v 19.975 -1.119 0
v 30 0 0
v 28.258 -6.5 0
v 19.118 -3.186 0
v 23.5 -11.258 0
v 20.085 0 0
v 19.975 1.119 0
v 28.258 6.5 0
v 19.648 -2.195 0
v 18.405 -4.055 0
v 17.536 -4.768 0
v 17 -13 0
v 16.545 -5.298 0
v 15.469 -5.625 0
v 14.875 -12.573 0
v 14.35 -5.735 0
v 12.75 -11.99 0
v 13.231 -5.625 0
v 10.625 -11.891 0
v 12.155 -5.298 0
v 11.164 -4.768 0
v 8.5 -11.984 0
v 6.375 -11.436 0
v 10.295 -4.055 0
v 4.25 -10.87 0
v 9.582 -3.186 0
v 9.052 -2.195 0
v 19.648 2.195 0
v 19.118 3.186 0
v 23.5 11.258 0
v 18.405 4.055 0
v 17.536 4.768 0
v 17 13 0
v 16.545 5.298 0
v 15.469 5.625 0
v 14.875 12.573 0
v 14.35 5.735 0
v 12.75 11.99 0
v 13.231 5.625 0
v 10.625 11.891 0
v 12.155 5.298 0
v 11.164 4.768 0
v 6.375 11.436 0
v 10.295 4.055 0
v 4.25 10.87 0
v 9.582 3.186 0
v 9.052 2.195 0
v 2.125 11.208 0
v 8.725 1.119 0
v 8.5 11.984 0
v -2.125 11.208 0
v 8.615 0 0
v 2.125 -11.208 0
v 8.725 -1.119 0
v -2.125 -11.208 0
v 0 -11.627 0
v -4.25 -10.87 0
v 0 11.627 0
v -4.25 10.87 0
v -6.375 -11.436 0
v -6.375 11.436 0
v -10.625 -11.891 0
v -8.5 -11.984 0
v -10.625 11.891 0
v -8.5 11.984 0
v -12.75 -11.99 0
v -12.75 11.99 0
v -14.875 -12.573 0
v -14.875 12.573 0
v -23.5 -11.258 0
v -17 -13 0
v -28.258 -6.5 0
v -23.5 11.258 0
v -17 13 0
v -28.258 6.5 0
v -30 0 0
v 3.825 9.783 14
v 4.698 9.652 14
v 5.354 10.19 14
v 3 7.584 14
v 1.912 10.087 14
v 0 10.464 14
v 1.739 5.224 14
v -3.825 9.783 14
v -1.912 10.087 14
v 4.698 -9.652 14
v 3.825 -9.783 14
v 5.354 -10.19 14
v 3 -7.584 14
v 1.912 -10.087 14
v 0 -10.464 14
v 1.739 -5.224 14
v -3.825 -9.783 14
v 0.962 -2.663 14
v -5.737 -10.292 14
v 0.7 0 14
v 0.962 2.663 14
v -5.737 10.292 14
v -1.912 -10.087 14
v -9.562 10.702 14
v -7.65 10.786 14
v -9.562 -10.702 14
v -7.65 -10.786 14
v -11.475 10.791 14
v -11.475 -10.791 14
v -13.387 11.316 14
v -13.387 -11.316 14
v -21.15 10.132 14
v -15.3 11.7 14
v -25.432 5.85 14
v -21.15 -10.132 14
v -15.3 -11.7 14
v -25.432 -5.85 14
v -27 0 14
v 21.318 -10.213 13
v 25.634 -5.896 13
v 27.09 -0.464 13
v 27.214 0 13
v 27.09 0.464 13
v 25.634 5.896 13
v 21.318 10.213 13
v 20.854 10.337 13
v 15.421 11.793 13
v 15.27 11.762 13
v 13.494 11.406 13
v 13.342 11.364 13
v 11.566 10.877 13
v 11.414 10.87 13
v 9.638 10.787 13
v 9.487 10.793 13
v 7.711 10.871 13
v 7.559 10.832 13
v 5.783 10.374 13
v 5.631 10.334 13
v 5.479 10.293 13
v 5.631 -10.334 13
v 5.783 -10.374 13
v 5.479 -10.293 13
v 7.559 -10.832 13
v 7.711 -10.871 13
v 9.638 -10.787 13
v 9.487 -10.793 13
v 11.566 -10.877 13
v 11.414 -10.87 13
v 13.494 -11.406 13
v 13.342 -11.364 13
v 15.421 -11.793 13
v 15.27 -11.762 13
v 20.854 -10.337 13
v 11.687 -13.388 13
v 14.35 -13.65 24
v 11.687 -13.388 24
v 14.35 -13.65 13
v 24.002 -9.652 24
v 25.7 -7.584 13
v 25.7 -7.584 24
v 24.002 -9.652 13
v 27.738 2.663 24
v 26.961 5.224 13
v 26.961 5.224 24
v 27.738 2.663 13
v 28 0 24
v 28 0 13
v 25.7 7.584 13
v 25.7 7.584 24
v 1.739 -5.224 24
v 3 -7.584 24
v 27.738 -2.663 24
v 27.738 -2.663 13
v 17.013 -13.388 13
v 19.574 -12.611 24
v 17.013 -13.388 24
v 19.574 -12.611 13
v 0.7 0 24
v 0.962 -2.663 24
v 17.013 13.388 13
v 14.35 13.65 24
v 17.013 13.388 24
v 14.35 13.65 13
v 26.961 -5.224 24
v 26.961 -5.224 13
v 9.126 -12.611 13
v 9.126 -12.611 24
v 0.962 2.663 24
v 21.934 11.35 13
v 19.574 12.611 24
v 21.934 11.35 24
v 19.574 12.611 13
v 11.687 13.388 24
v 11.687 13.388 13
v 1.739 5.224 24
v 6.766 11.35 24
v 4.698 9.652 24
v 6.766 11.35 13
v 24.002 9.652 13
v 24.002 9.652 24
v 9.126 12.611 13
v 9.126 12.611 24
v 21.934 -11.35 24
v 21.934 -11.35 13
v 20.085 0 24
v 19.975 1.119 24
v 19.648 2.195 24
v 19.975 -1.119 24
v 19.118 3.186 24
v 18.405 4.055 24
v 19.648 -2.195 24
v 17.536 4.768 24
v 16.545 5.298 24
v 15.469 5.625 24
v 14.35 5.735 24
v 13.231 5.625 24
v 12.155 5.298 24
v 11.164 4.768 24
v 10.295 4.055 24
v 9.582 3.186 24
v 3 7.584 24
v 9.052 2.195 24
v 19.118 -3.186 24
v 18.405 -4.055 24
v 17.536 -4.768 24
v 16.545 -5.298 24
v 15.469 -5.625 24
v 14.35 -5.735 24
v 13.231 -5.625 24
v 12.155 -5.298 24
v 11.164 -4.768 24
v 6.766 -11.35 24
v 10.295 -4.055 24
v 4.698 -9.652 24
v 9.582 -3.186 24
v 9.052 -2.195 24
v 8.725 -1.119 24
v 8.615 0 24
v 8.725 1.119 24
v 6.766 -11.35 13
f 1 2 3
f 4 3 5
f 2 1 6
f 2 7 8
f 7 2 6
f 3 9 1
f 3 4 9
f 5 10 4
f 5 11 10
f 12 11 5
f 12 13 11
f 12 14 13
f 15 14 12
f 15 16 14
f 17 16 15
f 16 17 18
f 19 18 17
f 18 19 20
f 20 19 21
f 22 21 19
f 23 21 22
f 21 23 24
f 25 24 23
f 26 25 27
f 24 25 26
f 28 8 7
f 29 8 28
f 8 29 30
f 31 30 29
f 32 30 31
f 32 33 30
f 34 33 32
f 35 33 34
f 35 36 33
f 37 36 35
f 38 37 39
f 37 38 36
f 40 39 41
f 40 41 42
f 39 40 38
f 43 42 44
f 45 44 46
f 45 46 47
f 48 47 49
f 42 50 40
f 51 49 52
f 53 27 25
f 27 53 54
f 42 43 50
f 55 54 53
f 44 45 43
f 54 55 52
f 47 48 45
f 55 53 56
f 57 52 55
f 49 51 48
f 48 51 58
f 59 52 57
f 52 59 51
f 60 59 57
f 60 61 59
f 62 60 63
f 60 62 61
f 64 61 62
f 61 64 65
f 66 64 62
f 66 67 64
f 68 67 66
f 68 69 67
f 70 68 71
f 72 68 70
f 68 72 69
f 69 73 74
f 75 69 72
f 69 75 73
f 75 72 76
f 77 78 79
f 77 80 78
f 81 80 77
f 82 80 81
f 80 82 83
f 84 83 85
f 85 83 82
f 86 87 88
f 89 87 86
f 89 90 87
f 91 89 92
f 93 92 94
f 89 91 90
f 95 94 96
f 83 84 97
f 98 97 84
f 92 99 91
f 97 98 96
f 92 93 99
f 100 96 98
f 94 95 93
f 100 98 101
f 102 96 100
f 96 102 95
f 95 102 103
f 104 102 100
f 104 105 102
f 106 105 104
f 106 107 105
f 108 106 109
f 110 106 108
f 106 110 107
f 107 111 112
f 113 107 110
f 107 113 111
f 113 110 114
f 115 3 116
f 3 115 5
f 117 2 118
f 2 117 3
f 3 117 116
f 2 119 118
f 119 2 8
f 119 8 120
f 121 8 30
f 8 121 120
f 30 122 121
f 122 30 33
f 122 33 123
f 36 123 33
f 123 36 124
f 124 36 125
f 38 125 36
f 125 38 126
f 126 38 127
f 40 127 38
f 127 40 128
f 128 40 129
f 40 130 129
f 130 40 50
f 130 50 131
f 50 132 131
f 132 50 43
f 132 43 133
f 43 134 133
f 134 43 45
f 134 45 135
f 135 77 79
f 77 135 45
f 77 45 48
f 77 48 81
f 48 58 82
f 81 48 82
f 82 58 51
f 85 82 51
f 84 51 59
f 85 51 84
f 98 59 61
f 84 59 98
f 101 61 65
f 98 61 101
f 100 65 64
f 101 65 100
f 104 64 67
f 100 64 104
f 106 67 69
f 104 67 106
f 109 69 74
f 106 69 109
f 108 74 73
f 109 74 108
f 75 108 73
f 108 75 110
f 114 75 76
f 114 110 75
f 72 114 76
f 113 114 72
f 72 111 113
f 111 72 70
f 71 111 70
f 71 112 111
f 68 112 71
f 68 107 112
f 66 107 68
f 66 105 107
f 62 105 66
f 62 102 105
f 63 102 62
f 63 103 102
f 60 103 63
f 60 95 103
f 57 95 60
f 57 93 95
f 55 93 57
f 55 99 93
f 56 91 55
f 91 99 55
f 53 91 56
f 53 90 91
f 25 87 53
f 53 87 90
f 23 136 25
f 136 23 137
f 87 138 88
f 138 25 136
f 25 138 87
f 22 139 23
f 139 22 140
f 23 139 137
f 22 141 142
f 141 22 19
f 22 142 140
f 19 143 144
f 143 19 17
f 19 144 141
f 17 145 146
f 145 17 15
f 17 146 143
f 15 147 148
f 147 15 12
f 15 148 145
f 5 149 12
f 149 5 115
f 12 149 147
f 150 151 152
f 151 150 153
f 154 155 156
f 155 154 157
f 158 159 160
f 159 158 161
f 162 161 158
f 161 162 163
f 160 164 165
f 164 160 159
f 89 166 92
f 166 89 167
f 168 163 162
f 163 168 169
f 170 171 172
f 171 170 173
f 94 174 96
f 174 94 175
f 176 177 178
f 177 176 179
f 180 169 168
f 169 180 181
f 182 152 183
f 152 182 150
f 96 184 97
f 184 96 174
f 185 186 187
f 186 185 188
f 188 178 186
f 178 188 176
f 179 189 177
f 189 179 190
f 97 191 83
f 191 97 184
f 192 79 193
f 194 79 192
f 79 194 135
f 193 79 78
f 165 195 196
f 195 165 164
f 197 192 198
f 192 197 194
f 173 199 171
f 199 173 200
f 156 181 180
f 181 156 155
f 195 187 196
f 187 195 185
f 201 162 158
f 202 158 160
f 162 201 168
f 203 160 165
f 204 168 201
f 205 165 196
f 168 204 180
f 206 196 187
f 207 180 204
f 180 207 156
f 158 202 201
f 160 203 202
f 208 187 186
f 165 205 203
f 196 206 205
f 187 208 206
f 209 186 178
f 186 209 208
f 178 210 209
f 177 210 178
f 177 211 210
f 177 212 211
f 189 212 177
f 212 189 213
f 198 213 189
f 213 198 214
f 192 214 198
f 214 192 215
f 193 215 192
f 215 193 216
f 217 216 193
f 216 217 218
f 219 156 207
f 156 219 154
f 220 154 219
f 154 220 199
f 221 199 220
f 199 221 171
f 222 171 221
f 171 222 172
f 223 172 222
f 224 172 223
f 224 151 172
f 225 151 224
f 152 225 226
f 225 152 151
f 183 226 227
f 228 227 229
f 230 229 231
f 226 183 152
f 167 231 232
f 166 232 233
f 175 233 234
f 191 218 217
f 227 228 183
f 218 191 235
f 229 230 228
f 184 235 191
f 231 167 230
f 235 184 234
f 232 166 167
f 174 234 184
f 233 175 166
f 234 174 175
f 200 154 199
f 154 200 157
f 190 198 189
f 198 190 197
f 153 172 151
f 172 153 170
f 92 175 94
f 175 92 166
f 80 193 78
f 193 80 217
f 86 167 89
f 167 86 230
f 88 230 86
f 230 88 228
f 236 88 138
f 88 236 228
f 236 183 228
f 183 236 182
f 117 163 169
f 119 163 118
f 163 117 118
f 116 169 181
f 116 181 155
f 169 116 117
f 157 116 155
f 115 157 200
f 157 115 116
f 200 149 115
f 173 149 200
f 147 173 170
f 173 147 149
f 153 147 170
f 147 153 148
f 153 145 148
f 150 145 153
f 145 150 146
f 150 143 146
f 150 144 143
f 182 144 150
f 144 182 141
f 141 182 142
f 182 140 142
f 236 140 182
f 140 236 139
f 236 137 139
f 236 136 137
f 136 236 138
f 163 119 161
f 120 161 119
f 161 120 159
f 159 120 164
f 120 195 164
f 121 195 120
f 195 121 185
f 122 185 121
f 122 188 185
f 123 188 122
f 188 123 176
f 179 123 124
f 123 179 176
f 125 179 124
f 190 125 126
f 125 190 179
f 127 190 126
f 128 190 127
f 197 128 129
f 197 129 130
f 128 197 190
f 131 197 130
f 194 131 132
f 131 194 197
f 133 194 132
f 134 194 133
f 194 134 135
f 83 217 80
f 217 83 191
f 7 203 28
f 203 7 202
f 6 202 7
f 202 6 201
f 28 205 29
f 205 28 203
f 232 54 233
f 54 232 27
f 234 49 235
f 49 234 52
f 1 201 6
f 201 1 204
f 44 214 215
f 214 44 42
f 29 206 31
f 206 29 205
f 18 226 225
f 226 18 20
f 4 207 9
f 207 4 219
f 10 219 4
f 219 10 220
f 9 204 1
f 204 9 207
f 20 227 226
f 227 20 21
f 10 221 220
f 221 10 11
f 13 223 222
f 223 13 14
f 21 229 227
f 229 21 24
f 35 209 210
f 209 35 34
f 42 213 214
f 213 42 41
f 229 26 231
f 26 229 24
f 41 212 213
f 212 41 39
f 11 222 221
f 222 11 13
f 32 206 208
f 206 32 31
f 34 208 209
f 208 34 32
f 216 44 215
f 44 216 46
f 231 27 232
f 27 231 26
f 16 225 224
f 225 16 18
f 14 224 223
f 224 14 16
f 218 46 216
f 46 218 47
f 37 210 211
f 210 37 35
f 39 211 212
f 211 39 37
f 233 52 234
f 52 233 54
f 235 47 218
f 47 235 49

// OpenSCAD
$fn = 32;

// ----------------------------------------------------------------------
// Handle: 60 x 26 mm grip, 14 mm thick
// ----------------------------------------------------------------------

// --- parameters (mm) ---
length = 60;              // grip length
width = 26;               // grip width
thickness = 14;           // grip thickness
waist = 0.86;             // width factor at the middle
draft = 0.9;              // top face scale of the extrusion
scallops = 4;             // finger rests per side
ripple = 0.04;            // depth factor of the finger rests
boss_d = 27.3;            // mounting boss diameter
boss_h = 10;              // mounting boss height
boss_hole_d = 11.47;      // screw clearance through the boss
boss_r = 14.35;           // boss centre from the grip centre

/* ergonomic grip outline, closed spline-like polygon in the XY plane */
grip = [[-17, 13], [-14.875, 12.573], [-12.75, 11.99], [-10.625, 11.891], [-8.5, 11.984], [-6.375, 11.436], [-4.25, 10.87], [-2.125, 11.208], [0, 11.627], [2.125, 11.208], [4.25, 10.87], [6.375, 11.436], [8.5, 11.984], [10.625, 11.891], [12.75, 11.99], [14.875, 12.573], [17, 13], [23.5, 11.258], [28.258, 6.5], [30, 0], [28.258, -6.5], [23.5, -11.258], [17, -13], [17, -13], [14.875, -12.573], [12.75, -11.99], [10.625, -11.891], [8.5, -11.984], [6.375, -11.436], [4.25, -10.87], [2.125, -11.208], [0, -11.627], [-2.125, -11.208], [-4.25, -10.87], [-6.375, -11.436], [-8.5, -11.984], [-10.625, -11.891], [-12.75, -11.99], [-14.875, -12.573], [-17, -13], [-23.5, -11.258], [-28.258, -6.5], [-30, 0], [-28.258, 6.5], [-23.5, 11.258], [-17, 13]];

module grip_body() {
  linear_extrude(height = thickness, scale = draft) polygon(grip);
}

module boss_body() {
  /* sunk 1 mm into the grip so the joint overlaps */
  translate([boss_r, 0, thickness - 1]) cylinder(h = boss_h + 1, d = boss_d);
}

difference() {
  union() {
    grip_body();
    boss_body();
  }
  translate([boss_r, 0, -1]) cylinder(h = thickness + boss_h + 2, d = boss_hole_d);
}
